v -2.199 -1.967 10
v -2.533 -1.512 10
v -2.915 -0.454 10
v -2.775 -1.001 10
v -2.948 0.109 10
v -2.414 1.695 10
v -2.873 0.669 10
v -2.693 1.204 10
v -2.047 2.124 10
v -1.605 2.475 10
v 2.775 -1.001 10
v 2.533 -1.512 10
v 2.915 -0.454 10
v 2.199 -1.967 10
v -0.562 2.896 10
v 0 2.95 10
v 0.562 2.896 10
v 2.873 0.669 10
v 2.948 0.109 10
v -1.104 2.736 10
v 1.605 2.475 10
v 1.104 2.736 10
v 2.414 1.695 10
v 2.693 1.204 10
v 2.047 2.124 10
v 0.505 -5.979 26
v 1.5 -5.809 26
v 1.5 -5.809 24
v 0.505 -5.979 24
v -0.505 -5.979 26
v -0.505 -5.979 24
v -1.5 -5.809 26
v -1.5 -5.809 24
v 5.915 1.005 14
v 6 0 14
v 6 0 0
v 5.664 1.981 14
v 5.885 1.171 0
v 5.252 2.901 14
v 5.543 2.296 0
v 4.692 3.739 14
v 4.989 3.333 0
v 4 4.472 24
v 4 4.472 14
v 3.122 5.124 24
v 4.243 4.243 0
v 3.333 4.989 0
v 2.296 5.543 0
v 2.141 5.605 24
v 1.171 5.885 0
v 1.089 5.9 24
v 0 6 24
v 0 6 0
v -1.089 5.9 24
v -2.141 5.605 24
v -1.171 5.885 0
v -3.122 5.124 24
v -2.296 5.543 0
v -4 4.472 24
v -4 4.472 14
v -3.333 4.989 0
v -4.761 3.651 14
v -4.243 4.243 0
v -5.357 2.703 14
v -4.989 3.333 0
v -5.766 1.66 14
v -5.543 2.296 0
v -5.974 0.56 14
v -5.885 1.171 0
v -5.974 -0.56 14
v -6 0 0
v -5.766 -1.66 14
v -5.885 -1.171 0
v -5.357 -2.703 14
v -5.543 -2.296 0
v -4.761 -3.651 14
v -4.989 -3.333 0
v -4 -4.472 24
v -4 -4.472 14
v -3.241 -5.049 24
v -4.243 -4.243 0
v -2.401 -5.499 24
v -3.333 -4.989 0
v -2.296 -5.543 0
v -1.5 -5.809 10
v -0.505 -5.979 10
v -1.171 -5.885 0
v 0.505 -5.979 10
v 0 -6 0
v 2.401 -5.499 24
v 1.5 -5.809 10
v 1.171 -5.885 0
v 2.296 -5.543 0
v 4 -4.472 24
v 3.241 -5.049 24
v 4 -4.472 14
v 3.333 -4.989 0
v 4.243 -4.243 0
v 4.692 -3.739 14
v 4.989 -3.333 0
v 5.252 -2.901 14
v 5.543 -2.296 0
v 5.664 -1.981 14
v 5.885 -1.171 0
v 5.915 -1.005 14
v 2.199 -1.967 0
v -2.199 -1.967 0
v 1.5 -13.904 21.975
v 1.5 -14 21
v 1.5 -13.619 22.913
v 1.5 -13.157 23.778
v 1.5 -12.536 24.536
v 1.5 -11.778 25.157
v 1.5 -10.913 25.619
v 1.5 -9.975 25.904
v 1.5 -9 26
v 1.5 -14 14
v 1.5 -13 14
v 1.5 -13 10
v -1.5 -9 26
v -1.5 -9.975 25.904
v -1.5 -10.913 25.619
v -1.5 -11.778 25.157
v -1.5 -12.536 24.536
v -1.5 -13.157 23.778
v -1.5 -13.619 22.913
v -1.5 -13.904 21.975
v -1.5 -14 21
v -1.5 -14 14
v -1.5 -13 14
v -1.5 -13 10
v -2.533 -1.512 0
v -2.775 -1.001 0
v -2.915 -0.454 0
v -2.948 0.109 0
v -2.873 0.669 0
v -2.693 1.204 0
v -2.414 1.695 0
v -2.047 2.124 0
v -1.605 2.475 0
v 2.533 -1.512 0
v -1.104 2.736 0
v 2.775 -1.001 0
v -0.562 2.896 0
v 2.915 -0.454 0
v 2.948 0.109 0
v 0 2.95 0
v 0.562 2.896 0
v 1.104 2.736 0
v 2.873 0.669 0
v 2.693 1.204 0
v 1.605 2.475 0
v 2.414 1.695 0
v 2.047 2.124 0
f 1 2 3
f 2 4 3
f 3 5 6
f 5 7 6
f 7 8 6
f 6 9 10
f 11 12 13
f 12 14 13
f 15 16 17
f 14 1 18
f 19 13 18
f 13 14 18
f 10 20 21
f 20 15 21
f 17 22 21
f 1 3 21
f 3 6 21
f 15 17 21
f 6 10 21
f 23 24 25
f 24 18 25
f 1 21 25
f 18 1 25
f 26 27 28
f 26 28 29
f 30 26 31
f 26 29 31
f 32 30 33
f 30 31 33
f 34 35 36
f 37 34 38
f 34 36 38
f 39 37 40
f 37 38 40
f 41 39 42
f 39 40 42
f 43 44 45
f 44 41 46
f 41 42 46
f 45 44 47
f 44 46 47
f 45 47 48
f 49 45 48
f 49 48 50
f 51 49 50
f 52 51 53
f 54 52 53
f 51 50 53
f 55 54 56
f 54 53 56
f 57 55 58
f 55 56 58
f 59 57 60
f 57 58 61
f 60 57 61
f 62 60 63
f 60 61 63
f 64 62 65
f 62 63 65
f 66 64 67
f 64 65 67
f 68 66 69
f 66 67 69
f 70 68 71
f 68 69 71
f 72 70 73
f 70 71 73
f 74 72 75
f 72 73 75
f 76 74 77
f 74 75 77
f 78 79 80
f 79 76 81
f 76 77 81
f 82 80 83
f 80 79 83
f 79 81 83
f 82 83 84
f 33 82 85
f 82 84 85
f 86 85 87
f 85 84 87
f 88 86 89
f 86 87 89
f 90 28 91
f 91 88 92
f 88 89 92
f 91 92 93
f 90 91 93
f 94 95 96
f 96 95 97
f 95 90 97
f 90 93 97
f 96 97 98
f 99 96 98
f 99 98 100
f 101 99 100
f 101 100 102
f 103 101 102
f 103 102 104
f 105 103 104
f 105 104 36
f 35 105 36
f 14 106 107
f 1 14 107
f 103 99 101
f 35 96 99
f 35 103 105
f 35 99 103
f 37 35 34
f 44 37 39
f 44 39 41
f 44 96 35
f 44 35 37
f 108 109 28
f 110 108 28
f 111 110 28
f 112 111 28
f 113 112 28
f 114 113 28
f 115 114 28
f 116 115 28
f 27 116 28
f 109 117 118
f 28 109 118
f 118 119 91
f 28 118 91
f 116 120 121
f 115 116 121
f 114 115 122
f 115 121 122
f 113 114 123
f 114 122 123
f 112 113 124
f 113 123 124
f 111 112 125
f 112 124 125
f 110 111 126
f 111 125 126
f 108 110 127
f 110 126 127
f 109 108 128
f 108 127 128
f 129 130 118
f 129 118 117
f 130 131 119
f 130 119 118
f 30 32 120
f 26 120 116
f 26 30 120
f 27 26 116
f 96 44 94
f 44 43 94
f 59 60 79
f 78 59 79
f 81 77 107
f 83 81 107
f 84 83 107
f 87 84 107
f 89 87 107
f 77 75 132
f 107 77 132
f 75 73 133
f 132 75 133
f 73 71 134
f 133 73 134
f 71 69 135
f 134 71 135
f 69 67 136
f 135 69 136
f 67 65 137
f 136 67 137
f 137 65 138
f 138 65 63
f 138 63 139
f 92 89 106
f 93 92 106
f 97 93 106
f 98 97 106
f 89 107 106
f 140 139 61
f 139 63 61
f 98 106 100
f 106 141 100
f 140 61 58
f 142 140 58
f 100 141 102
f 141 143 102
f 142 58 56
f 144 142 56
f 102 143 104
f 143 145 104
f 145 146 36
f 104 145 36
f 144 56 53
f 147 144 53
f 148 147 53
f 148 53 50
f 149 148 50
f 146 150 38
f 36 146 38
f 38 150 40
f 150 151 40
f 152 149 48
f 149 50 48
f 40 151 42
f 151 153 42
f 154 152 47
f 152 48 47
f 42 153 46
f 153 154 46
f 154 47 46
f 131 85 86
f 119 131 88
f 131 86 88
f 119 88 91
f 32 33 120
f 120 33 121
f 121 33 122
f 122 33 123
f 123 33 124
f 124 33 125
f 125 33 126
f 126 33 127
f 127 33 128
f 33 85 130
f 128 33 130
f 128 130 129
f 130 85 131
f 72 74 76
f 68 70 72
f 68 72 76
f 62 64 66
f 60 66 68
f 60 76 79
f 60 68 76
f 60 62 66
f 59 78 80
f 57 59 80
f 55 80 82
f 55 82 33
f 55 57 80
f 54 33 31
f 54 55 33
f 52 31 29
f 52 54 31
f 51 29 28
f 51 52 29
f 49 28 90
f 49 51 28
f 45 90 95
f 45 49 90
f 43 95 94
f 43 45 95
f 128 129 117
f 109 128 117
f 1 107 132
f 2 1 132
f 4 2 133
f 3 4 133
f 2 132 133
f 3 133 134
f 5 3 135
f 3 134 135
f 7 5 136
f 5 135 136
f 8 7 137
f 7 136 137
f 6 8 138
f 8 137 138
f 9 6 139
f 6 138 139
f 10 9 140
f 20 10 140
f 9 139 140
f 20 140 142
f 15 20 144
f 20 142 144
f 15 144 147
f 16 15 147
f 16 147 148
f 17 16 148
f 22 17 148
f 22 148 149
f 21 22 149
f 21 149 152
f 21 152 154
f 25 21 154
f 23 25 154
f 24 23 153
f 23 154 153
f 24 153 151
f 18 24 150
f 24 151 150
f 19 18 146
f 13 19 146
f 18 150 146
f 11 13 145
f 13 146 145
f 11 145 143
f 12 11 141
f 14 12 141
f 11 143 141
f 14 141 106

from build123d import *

# Parameters (mm, degrees)
F0_R      = 6
F1_DEPTH  = 10
F2_R      = 6
F3_DEPTH  = 6
F5_DEPTH  = 16
F7_DEPTH  = 8
F8_W      = 1
F8_H      = 4
F9_DEPTH  = 7.501
F10_DEPTH = 2


# Not quite as in the source:
# - a feature names something its author has since deleted; it is built from what else it names


with BuildPart() as f1:
    # F0 (on Top) → F1 (new body)
    with BuildSketch(Plane.XY):
        Circle(F0_R)
        with BuildLine():
            ThreePointArc((-2.1988001779, -1.9666666667), (0, 2.95), (2.1988001779, -1.9666666667))
            Line((2.1988001779, -1.9666666667), (-2.1988001779, -1.9666666667))
        make_face(mode=Mode.SUBTRACT)
    extrude(amount=F1_DEPTH)

    # F2 (on face) → F3 (join)
    with BuildSketch(Plane.XY.offset(10)):
        Circle(F2_R)
    extrude(amount=F3_DEPTH)



with BuildPart() as f5:
    # F4 (on face) → F5 (new body)
    with BuildSketch(Plane.XY.offset(10)):
        with BuildLine():
            ThreePointArc((1.5, -5.8094750193), (0, -6), (-1.5, -5.8094750193))
            Line((-1.5, -5.8094750193), (-1.5, -14))
            Line((-1.5, -14), (1.5, -14))
            Line((1.5, -14), (1.5, -5.8094750193))
        make_face()
    extrude(amount=F5_DEPTH)


with BuildPart() as f1_1:
    add(f1.part)

    add(f5.part)  # F7 merges F5
    # F6 (on face) → F7 (join)
    with BuildSketch(Plane.XY.offset(16)):
        with BuildLine():
            Line((-4, 4.472135955), (-4, -4.472135955))
            ThreePointArc((-4, -4.472135955), (0, -6), (4, -4.472135955))
            Line((4, -4.472135955), (4, 4.472135955))
            ThreePointArc((4, 4.472135955), (0, 6), (-4, 4.472135955))
        make_face()
    extrude(amount=F7_DEPTH)

    # F8 (on face) → F9 (cut, through all)
    with BuildSketch(Plane(origin=(-1.5, 0, 0), x_dir=(0, -1, 0), z_dir=(-1, 0, 0))):
        with BuildLine():
            ThreePointArc((9, 26), (12.5355339059, 24.5355339059), (14, 21))
            Line((14, 21), (14, 26))
            Line((14, 26), (9, 26))
        make_face()
        with Locations((13.5, 12)):
            Rectangle(F8_W, F8_H)
    extrude(amount=-F9_DEPTH, mode=Mode.SUBTRACT)

    # F6 (on face) → F10 (cut)
    with BuildSketch(Plane.XY.offset(16)):
        with BuildLine():
            Line((4, 4.472135955), (4, -4.472135955))
            ThreePointArc((4, -4.472135955), (5.4772255751, -2.4494897428), (6, 0))
            ThreePointArc((6, 0), (5.4772255751, 2.4494897428), (4, 4.472135955))
        make_face()
        with BuildLine():
            ThreePointArc((-4, 4.472135955), (-6, 0), (-4, -4.472135955))
            Line((-4, -4.472135955), (-4, 4.472135955))
        make_face()
    extrude(amount=-F10_DEPTH, mode=Mode.SUBTRACT)


solid = f1_1.part
